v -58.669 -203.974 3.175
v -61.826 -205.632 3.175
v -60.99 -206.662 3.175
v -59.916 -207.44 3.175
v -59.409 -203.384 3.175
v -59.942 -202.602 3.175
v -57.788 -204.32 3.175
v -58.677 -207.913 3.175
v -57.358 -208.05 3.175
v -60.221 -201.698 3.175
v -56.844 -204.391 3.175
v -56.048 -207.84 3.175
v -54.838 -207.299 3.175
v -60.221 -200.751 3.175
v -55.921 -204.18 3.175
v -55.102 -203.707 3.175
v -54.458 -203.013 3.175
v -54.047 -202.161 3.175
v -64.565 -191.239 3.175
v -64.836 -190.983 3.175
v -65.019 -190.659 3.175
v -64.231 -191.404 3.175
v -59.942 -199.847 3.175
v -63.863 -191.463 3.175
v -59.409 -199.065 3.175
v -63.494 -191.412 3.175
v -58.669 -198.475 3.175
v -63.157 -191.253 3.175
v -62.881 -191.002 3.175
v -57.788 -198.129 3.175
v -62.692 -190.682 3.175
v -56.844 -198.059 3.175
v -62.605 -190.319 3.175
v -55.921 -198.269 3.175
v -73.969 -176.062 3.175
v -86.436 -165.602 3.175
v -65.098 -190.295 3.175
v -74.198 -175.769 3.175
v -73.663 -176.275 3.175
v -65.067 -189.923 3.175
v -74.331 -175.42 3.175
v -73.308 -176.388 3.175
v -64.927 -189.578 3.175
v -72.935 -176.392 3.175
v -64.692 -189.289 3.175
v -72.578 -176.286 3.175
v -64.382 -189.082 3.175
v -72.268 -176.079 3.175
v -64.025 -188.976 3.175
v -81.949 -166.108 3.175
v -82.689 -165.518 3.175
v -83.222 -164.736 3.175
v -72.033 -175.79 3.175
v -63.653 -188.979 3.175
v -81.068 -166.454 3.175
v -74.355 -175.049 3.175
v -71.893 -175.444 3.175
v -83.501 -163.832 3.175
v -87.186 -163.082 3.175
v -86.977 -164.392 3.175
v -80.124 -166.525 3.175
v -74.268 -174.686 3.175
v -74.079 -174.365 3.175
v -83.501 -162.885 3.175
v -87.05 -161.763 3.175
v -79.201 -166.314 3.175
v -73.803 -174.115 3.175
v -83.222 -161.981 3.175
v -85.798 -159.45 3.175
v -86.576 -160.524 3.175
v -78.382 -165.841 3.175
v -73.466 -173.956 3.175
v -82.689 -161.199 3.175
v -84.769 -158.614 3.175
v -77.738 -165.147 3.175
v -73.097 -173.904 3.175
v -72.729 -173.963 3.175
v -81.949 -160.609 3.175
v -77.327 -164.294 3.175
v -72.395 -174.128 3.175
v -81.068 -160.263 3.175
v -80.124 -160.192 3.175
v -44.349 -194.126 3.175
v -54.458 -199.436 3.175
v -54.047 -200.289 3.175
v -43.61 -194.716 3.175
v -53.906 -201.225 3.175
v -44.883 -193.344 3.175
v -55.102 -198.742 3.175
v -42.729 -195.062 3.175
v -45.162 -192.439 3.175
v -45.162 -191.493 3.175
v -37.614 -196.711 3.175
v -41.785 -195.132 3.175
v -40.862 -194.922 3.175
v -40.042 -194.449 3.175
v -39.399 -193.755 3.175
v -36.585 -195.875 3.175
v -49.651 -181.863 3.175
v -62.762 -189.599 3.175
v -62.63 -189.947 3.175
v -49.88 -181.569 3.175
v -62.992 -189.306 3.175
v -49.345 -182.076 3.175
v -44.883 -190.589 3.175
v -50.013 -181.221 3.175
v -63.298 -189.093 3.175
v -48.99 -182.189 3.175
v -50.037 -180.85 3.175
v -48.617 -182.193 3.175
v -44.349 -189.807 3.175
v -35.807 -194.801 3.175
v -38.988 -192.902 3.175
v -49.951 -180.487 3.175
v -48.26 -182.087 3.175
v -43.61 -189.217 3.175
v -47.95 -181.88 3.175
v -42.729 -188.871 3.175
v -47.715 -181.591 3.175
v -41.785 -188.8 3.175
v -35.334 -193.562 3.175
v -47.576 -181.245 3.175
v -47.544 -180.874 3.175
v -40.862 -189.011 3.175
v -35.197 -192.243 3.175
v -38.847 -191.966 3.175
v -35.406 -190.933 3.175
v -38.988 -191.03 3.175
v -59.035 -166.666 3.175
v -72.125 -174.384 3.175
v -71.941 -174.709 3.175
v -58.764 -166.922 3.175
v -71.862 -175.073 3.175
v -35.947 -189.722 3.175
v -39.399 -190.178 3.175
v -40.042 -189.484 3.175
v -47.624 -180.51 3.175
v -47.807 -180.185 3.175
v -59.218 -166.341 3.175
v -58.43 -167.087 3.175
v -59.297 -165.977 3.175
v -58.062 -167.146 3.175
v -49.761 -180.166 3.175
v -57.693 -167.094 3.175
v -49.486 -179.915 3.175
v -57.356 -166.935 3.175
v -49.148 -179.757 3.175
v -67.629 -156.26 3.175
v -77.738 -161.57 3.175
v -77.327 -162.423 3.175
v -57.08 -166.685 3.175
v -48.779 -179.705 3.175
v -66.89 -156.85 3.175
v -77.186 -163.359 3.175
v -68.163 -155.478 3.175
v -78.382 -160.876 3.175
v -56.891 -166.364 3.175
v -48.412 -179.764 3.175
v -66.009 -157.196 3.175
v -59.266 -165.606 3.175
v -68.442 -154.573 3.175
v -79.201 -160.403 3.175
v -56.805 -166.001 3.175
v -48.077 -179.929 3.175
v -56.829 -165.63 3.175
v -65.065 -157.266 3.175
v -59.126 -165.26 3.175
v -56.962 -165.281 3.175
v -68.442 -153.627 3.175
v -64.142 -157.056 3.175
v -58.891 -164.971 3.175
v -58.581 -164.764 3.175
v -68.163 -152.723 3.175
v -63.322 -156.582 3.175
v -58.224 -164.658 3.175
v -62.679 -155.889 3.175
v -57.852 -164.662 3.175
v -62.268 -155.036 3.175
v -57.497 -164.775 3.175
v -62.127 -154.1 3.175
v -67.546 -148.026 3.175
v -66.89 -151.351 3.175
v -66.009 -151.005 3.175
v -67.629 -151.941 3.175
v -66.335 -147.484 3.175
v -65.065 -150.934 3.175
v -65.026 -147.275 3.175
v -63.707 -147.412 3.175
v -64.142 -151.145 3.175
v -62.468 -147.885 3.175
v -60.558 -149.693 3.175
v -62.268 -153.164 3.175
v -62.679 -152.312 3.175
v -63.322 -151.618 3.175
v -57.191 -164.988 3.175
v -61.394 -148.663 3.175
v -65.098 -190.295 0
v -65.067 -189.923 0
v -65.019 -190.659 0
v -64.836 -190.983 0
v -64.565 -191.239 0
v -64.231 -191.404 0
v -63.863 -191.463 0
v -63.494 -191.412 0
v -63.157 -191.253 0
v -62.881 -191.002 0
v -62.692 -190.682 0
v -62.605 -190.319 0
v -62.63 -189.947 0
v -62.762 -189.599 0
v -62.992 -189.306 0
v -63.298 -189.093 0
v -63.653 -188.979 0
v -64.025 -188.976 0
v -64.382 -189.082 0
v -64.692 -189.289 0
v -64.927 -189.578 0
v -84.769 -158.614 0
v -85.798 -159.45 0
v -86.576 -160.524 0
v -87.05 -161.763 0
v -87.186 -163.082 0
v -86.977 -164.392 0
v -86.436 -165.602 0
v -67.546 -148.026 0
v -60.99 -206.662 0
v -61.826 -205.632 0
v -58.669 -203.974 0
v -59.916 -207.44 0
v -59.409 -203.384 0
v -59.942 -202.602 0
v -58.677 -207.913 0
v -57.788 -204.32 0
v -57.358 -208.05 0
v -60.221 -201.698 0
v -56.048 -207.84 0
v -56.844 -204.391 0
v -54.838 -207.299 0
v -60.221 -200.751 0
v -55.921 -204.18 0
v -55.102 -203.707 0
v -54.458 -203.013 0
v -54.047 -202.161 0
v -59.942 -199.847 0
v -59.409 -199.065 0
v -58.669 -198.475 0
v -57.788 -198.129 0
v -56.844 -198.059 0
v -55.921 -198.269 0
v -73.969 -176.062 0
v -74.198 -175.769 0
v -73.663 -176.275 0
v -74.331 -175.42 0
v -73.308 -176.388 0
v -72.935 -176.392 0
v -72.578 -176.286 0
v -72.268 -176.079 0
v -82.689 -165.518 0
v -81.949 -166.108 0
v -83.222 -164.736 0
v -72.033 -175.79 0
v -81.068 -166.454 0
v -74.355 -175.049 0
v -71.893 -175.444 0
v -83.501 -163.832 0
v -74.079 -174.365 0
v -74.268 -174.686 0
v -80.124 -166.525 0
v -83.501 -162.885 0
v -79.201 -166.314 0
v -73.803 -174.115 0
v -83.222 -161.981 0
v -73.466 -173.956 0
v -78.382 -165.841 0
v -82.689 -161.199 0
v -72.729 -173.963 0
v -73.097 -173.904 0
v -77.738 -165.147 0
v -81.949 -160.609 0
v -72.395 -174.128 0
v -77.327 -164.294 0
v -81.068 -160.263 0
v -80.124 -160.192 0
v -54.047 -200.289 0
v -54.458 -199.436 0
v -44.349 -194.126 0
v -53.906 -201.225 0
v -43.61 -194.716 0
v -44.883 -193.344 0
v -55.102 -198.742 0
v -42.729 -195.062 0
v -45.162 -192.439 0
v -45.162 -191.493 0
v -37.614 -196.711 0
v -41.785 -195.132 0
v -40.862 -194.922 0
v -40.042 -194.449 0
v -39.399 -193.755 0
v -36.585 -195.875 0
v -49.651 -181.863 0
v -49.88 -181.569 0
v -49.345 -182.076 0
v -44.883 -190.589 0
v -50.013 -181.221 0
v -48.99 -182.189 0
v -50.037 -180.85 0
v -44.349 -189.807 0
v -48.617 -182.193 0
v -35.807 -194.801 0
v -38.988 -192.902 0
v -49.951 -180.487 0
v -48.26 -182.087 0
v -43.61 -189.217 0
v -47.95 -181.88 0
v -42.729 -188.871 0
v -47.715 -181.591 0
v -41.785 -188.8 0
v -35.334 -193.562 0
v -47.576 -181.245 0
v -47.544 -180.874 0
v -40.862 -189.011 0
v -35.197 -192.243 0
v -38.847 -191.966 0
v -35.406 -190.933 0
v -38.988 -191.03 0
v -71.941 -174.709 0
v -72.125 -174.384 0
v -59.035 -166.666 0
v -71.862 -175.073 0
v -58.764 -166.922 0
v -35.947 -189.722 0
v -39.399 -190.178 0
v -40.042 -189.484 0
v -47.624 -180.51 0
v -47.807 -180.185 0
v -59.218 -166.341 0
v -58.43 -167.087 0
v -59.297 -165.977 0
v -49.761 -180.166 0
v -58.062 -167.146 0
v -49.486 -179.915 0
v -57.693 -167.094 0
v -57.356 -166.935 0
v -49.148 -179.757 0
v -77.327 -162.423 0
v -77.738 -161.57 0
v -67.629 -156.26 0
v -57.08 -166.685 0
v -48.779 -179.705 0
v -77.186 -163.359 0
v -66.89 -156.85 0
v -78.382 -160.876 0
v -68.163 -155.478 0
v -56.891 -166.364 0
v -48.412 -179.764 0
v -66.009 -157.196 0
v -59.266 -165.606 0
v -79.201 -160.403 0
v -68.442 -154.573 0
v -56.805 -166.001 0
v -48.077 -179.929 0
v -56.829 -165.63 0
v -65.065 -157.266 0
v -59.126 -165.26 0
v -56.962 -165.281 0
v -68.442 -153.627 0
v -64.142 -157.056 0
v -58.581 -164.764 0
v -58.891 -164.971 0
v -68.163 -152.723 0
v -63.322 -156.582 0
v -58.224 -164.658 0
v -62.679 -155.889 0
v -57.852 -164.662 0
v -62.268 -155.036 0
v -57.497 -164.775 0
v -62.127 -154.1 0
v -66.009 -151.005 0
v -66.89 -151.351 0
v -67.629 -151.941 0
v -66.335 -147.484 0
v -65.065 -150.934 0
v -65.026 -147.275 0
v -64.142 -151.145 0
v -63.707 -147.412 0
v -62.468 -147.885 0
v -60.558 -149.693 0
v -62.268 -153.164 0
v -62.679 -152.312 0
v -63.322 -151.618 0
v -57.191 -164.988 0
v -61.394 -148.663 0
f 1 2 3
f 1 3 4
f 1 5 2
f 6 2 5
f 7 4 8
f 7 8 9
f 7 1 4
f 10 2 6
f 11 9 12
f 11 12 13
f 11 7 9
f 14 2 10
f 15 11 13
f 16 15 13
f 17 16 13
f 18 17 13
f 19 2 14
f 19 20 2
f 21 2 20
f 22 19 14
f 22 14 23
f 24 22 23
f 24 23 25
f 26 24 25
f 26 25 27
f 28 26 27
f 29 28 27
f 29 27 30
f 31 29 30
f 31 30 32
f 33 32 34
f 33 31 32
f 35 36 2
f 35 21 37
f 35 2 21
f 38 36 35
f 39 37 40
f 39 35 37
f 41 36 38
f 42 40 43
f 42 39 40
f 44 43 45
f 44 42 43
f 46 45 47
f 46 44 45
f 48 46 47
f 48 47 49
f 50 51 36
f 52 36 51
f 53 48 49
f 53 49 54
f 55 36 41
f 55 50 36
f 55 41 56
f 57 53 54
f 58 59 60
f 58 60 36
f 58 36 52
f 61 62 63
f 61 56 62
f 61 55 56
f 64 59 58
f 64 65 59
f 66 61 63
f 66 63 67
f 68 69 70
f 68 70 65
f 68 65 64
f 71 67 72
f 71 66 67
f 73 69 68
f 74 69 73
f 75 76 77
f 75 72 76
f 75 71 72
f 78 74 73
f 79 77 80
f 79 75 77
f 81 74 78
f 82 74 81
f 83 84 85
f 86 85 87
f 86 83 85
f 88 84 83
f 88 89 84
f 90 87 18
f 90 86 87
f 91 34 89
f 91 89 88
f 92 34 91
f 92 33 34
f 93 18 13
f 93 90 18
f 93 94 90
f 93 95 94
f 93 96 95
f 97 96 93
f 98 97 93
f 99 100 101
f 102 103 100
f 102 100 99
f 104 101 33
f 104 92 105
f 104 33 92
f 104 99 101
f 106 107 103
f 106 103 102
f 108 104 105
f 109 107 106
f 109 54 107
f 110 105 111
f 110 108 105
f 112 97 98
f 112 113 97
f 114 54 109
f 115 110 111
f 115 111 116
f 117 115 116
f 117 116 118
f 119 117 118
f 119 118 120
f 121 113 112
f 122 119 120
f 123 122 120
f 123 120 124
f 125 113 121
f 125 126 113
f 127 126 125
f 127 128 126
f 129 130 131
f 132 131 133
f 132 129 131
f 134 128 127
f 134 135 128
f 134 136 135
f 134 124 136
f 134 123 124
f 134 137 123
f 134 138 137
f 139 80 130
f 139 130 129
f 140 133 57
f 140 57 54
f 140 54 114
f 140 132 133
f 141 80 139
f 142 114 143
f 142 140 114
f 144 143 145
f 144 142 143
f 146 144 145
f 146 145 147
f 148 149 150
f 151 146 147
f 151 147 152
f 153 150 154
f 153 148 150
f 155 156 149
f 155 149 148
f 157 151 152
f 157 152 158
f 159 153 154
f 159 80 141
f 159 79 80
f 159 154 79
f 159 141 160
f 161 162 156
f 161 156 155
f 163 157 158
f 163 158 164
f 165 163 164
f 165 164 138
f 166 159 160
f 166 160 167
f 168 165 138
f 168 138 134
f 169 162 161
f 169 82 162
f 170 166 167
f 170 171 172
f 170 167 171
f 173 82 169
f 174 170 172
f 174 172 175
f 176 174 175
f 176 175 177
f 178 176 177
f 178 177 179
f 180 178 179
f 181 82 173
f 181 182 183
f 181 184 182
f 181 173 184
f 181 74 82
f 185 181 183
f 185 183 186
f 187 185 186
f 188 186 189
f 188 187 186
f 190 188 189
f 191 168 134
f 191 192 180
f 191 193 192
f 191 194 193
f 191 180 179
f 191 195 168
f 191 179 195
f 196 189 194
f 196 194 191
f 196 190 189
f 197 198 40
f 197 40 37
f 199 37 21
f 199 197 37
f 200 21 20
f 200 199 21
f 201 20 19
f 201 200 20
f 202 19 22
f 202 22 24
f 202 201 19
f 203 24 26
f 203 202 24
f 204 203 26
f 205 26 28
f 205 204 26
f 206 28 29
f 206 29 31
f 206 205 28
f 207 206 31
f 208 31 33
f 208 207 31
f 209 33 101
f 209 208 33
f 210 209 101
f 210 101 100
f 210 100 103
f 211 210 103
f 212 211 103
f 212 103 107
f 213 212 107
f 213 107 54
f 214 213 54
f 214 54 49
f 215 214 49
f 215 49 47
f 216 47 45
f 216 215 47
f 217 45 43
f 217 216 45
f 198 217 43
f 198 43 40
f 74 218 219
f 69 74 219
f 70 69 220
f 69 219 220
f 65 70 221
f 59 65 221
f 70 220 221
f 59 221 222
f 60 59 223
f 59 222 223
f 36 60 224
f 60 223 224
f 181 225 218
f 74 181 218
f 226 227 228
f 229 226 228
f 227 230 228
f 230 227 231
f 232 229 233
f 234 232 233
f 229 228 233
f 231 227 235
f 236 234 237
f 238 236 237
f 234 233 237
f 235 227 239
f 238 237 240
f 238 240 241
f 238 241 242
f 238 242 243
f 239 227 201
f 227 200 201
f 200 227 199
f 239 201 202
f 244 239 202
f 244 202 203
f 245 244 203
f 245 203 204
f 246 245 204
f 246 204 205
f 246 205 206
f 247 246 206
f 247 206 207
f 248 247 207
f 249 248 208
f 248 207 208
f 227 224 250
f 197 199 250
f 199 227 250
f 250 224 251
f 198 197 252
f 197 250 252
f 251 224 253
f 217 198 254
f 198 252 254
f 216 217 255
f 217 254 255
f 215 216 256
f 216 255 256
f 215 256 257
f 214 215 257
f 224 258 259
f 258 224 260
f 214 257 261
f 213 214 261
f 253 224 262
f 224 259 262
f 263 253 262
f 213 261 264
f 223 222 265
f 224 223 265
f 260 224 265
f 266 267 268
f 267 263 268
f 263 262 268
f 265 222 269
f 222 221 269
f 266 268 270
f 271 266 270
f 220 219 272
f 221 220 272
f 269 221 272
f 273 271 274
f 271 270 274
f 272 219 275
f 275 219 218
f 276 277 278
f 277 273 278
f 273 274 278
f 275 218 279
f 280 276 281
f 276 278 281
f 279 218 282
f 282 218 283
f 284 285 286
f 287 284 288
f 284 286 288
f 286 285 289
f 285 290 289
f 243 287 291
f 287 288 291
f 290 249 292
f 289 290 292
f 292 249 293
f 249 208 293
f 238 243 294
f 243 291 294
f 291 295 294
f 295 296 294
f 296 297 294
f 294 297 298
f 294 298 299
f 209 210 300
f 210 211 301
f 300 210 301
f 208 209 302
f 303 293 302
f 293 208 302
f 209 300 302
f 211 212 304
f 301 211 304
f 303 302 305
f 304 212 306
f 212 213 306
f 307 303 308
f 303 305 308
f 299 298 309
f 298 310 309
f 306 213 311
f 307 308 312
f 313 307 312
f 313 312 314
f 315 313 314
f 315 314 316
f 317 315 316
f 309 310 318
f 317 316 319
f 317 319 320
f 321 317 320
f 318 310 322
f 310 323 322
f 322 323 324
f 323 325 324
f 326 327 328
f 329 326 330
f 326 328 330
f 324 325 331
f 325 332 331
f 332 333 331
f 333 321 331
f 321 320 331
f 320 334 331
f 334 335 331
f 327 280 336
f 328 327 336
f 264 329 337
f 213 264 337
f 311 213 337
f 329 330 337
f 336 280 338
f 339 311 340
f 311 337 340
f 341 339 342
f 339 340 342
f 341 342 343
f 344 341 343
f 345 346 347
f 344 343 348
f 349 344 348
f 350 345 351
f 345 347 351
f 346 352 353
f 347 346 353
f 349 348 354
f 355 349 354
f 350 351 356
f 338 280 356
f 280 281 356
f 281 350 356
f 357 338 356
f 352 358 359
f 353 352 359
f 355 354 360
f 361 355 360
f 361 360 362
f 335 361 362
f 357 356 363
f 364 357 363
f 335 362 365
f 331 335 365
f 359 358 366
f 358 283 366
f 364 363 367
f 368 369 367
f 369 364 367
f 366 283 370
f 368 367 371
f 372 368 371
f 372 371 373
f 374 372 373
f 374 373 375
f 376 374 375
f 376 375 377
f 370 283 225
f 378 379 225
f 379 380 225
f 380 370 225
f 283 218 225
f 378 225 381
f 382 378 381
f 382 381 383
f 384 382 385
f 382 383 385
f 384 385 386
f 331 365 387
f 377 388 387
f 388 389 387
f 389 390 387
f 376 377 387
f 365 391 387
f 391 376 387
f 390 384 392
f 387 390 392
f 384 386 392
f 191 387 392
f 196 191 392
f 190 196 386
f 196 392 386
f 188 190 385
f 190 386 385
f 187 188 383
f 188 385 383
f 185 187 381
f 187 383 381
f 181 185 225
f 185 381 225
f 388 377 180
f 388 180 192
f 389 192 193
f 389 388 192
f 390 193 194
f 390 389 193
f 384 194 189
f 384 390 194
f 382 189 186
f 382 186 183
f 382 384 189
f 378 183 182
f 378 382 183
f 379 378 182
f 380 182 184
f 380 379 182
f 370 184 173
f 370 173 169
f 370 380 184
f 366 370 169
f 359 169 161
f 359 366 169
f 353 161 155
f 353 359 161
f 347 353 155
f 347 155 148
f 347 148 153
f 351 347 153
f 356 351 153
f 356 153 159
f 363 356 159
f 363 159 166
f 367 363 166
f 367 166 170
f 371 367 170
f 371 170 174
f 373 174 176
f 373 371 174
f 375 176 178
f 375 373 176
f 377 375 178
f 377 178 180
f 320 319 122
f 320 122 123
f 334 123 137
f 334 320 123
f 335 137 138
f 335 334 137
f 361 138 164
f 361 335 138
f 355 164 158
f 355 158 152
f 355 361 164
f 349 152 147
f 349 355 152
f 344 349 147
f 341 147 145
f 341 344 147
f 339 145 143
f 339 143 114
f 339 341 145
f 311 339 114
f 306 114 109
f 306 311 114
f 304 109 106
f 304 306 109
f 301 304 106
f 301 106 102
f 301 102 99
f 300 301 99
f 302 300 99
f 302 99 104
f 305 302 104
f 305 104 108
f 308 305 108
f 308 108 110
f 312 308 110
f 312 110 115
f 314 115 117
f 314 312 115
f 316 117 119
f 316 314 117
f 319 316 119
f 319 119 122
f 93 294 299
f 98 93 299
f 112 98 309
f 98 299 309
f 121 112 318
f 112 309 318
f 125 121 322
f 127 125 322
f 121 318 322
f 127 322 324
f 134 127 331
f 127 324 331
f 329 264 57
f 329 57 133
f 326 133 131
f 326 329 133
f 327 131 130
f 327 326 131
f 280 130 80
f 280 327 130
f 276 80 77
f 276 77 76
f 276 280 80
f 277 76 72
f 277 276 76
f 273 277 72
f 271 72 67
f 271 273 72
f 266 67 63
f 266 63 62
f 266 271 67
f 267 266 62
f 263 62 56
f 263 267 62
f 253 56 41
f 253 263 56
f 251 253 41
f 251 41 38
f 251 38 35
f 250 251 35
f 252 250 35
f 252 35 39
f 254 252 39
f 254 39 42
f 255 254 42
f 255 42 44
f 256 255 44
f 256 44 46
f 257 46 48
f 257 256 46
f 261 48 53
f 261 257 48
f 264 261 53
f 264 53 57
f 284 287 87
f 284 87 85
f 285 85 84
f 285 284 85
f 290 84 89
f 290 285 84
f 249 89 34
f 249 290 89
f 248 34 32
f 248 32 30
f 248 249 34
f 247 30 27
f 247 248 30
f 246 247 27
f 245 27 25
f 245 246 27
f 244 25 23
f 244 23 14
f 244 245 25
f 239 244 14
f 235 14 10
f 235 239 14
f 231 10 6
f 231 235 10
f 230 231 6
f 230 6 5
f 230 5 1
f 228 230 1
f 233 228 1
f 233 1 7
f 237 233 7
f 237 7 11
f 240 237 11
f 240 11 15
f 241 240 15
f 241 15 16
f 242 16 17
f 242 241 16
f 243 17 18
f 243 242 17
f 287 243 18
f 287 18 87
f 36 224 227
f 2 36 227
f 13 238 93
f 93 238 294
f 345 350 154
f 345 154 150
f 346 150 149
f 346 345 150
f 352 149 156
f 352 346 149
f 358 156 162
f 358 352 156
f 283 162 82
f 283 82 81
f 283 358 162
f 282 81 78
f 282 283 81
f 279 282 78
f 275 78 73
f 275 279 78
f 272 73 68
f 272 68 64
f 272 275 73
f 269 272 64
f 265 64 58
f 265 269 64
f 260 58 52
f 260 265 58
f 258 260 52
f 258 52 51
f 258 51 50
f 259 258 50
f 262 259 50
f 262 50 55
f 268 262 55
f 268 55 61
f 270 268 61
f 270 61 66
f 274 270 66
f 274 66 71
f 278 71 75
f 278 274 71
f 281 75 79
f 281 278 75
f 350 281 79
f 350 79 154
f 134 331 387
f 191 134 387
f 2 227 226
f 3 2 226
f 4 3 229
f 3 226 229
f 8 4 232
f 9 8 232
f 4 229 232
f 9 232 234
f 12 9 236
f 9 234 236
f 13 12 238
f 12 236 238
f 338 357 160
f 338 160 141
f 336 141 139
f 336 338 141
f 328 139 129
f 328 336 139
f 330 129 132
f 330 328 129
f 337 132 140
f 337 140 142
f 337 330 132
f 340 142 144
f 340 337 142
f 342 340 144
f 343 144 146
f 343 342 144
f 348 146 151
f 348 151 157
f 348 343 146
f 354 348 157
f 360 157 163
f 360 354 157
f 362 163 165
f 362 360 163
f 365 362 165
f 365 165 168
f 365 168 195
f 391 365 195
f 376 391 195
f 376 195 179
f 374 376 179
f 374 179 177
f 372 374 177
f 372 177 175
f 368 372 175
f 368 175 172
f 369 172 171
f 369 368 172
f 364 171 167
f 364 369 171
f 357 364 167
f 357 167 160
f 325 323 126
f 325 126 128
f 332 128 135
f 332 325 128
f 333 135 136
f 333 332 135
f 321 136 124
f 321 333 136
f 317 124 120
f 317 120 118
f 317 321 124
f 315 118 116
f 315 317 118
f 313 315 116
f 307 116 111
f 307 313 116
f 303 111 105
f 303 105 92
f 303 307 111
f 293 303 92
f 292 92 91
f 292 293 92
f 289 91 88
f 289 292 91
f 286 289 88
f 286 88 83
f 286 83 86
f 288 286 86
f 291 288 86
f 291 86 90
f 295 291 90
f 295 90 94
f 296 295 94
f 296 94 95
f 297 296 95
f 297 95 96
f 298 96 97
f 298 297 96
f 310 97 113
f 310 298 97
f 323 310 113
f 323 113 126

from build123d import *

# Parameters (mm, degrees)
SKETCH1_R           = 3.175
BOSS_EXTRUDE1_DEPTH = 3.175


with BuildPart() as part:
    # Sketch1 → Boss-Extrude1 (new body)
    with BuildSketch(Plane.XY):
        with BuildLine():
            Line((-86.435913995, -165.602360031), (-61.825632619, -205.632275727))
            ThreePointArc((-61.825632619, -205.632275727), (-58.676812327, -207.913058463), (-54.837503206, -207.299263221))
            Line((-54.837503206, -207.299263221), (-37.614442835, -196.710573375))
            ThreePointArc((-37.614442835, -196.710573375), (-35.333660099, -193.561753082), (-35.947455341, -189.722443962))
            Line((-35.947455341, -189.722443962), (-60.557736717, -149.692528266))
            ThreePointArc((-60.557736717, -149.692528266), (-63.706557009, -147.411745529), (-67.54586613, -148.025540772))
            Line((-67.54586613, -148.025540772), (-84.768926501, -158.614230618))
            ThreePointArc((-84.768926501, -158.614230618), (-87.049709237, -161.763050911), (-86.435913995, -165.602360031))
        make_face()
        with Locations((-80.361323188, -163.358535945)):
            Circle(SKETCH1_R, mode=Mode.SUBTRACT)
        with Locations((-65.302042044, -154.100131579)):
            Circle(SKETCH1_R, mode=Mode.SUBTRACT)
        with Locations((-42.022046148, -191.966268048)):
            Circle(SKETCH1_R, mode=Mode.SUBTRACT)
        with Locations((-57.081327292, -201.224672414)):
            Circle(SKETCH1_R, mode=Mode.SUBTRACT)
        with BuildLine():
            ThreePointArc((-62.635083896, -190.503539682), (-63.560924333, -188.997611568), (-65.066852447, -189.923452004))
            ThreePointArc((-65.066852447, -189.923452004), (-64.141012011, -191.429380119), (-62.635083896, -190.503539682))
        make_face(mode=Mode.SUBTRACT)
        with BuildLine():
            ThreePointArc((-50.007571303, -180.665047637), (-49.081730866, -182.170975752), (-47.575802752, -181.245135315))
            ThreePointArc((-47.575802752, -181.245135315), (-48.501643188, -179.739207201), (-50.007571303, -180.665047637))
        make_face(mode=Mode.SUBTRACT)
        with BuildLine():
            ThreePointArc((-56.834207119, -166.185854171), (-57.760047555, -164.679926057), (-59.26597567, -165.605766493))
            ThreePointArc((-59.26597567, -165.605766493), (-58.340135233, -167.111694608), (-56.834207119, -166.185854171))
        make_face(mode=Mode.SUBTRACT)
        with BuildLine():
            ThreePointArc((-74.325256814, -174.86417086), (-73.399416377, -176.370098974), (-71.893488263, -175.444258538))
            ThreePointArc((-71.893488263, -175.444258538), (-72.819328699, -173.938330423), (-74.325256814, -174.86417086))
        make_face(mode=Mode.SUBTRACT)
    extrude(amount=BOSS_EXTRUDE1_DEPTH)


solid = part.part
